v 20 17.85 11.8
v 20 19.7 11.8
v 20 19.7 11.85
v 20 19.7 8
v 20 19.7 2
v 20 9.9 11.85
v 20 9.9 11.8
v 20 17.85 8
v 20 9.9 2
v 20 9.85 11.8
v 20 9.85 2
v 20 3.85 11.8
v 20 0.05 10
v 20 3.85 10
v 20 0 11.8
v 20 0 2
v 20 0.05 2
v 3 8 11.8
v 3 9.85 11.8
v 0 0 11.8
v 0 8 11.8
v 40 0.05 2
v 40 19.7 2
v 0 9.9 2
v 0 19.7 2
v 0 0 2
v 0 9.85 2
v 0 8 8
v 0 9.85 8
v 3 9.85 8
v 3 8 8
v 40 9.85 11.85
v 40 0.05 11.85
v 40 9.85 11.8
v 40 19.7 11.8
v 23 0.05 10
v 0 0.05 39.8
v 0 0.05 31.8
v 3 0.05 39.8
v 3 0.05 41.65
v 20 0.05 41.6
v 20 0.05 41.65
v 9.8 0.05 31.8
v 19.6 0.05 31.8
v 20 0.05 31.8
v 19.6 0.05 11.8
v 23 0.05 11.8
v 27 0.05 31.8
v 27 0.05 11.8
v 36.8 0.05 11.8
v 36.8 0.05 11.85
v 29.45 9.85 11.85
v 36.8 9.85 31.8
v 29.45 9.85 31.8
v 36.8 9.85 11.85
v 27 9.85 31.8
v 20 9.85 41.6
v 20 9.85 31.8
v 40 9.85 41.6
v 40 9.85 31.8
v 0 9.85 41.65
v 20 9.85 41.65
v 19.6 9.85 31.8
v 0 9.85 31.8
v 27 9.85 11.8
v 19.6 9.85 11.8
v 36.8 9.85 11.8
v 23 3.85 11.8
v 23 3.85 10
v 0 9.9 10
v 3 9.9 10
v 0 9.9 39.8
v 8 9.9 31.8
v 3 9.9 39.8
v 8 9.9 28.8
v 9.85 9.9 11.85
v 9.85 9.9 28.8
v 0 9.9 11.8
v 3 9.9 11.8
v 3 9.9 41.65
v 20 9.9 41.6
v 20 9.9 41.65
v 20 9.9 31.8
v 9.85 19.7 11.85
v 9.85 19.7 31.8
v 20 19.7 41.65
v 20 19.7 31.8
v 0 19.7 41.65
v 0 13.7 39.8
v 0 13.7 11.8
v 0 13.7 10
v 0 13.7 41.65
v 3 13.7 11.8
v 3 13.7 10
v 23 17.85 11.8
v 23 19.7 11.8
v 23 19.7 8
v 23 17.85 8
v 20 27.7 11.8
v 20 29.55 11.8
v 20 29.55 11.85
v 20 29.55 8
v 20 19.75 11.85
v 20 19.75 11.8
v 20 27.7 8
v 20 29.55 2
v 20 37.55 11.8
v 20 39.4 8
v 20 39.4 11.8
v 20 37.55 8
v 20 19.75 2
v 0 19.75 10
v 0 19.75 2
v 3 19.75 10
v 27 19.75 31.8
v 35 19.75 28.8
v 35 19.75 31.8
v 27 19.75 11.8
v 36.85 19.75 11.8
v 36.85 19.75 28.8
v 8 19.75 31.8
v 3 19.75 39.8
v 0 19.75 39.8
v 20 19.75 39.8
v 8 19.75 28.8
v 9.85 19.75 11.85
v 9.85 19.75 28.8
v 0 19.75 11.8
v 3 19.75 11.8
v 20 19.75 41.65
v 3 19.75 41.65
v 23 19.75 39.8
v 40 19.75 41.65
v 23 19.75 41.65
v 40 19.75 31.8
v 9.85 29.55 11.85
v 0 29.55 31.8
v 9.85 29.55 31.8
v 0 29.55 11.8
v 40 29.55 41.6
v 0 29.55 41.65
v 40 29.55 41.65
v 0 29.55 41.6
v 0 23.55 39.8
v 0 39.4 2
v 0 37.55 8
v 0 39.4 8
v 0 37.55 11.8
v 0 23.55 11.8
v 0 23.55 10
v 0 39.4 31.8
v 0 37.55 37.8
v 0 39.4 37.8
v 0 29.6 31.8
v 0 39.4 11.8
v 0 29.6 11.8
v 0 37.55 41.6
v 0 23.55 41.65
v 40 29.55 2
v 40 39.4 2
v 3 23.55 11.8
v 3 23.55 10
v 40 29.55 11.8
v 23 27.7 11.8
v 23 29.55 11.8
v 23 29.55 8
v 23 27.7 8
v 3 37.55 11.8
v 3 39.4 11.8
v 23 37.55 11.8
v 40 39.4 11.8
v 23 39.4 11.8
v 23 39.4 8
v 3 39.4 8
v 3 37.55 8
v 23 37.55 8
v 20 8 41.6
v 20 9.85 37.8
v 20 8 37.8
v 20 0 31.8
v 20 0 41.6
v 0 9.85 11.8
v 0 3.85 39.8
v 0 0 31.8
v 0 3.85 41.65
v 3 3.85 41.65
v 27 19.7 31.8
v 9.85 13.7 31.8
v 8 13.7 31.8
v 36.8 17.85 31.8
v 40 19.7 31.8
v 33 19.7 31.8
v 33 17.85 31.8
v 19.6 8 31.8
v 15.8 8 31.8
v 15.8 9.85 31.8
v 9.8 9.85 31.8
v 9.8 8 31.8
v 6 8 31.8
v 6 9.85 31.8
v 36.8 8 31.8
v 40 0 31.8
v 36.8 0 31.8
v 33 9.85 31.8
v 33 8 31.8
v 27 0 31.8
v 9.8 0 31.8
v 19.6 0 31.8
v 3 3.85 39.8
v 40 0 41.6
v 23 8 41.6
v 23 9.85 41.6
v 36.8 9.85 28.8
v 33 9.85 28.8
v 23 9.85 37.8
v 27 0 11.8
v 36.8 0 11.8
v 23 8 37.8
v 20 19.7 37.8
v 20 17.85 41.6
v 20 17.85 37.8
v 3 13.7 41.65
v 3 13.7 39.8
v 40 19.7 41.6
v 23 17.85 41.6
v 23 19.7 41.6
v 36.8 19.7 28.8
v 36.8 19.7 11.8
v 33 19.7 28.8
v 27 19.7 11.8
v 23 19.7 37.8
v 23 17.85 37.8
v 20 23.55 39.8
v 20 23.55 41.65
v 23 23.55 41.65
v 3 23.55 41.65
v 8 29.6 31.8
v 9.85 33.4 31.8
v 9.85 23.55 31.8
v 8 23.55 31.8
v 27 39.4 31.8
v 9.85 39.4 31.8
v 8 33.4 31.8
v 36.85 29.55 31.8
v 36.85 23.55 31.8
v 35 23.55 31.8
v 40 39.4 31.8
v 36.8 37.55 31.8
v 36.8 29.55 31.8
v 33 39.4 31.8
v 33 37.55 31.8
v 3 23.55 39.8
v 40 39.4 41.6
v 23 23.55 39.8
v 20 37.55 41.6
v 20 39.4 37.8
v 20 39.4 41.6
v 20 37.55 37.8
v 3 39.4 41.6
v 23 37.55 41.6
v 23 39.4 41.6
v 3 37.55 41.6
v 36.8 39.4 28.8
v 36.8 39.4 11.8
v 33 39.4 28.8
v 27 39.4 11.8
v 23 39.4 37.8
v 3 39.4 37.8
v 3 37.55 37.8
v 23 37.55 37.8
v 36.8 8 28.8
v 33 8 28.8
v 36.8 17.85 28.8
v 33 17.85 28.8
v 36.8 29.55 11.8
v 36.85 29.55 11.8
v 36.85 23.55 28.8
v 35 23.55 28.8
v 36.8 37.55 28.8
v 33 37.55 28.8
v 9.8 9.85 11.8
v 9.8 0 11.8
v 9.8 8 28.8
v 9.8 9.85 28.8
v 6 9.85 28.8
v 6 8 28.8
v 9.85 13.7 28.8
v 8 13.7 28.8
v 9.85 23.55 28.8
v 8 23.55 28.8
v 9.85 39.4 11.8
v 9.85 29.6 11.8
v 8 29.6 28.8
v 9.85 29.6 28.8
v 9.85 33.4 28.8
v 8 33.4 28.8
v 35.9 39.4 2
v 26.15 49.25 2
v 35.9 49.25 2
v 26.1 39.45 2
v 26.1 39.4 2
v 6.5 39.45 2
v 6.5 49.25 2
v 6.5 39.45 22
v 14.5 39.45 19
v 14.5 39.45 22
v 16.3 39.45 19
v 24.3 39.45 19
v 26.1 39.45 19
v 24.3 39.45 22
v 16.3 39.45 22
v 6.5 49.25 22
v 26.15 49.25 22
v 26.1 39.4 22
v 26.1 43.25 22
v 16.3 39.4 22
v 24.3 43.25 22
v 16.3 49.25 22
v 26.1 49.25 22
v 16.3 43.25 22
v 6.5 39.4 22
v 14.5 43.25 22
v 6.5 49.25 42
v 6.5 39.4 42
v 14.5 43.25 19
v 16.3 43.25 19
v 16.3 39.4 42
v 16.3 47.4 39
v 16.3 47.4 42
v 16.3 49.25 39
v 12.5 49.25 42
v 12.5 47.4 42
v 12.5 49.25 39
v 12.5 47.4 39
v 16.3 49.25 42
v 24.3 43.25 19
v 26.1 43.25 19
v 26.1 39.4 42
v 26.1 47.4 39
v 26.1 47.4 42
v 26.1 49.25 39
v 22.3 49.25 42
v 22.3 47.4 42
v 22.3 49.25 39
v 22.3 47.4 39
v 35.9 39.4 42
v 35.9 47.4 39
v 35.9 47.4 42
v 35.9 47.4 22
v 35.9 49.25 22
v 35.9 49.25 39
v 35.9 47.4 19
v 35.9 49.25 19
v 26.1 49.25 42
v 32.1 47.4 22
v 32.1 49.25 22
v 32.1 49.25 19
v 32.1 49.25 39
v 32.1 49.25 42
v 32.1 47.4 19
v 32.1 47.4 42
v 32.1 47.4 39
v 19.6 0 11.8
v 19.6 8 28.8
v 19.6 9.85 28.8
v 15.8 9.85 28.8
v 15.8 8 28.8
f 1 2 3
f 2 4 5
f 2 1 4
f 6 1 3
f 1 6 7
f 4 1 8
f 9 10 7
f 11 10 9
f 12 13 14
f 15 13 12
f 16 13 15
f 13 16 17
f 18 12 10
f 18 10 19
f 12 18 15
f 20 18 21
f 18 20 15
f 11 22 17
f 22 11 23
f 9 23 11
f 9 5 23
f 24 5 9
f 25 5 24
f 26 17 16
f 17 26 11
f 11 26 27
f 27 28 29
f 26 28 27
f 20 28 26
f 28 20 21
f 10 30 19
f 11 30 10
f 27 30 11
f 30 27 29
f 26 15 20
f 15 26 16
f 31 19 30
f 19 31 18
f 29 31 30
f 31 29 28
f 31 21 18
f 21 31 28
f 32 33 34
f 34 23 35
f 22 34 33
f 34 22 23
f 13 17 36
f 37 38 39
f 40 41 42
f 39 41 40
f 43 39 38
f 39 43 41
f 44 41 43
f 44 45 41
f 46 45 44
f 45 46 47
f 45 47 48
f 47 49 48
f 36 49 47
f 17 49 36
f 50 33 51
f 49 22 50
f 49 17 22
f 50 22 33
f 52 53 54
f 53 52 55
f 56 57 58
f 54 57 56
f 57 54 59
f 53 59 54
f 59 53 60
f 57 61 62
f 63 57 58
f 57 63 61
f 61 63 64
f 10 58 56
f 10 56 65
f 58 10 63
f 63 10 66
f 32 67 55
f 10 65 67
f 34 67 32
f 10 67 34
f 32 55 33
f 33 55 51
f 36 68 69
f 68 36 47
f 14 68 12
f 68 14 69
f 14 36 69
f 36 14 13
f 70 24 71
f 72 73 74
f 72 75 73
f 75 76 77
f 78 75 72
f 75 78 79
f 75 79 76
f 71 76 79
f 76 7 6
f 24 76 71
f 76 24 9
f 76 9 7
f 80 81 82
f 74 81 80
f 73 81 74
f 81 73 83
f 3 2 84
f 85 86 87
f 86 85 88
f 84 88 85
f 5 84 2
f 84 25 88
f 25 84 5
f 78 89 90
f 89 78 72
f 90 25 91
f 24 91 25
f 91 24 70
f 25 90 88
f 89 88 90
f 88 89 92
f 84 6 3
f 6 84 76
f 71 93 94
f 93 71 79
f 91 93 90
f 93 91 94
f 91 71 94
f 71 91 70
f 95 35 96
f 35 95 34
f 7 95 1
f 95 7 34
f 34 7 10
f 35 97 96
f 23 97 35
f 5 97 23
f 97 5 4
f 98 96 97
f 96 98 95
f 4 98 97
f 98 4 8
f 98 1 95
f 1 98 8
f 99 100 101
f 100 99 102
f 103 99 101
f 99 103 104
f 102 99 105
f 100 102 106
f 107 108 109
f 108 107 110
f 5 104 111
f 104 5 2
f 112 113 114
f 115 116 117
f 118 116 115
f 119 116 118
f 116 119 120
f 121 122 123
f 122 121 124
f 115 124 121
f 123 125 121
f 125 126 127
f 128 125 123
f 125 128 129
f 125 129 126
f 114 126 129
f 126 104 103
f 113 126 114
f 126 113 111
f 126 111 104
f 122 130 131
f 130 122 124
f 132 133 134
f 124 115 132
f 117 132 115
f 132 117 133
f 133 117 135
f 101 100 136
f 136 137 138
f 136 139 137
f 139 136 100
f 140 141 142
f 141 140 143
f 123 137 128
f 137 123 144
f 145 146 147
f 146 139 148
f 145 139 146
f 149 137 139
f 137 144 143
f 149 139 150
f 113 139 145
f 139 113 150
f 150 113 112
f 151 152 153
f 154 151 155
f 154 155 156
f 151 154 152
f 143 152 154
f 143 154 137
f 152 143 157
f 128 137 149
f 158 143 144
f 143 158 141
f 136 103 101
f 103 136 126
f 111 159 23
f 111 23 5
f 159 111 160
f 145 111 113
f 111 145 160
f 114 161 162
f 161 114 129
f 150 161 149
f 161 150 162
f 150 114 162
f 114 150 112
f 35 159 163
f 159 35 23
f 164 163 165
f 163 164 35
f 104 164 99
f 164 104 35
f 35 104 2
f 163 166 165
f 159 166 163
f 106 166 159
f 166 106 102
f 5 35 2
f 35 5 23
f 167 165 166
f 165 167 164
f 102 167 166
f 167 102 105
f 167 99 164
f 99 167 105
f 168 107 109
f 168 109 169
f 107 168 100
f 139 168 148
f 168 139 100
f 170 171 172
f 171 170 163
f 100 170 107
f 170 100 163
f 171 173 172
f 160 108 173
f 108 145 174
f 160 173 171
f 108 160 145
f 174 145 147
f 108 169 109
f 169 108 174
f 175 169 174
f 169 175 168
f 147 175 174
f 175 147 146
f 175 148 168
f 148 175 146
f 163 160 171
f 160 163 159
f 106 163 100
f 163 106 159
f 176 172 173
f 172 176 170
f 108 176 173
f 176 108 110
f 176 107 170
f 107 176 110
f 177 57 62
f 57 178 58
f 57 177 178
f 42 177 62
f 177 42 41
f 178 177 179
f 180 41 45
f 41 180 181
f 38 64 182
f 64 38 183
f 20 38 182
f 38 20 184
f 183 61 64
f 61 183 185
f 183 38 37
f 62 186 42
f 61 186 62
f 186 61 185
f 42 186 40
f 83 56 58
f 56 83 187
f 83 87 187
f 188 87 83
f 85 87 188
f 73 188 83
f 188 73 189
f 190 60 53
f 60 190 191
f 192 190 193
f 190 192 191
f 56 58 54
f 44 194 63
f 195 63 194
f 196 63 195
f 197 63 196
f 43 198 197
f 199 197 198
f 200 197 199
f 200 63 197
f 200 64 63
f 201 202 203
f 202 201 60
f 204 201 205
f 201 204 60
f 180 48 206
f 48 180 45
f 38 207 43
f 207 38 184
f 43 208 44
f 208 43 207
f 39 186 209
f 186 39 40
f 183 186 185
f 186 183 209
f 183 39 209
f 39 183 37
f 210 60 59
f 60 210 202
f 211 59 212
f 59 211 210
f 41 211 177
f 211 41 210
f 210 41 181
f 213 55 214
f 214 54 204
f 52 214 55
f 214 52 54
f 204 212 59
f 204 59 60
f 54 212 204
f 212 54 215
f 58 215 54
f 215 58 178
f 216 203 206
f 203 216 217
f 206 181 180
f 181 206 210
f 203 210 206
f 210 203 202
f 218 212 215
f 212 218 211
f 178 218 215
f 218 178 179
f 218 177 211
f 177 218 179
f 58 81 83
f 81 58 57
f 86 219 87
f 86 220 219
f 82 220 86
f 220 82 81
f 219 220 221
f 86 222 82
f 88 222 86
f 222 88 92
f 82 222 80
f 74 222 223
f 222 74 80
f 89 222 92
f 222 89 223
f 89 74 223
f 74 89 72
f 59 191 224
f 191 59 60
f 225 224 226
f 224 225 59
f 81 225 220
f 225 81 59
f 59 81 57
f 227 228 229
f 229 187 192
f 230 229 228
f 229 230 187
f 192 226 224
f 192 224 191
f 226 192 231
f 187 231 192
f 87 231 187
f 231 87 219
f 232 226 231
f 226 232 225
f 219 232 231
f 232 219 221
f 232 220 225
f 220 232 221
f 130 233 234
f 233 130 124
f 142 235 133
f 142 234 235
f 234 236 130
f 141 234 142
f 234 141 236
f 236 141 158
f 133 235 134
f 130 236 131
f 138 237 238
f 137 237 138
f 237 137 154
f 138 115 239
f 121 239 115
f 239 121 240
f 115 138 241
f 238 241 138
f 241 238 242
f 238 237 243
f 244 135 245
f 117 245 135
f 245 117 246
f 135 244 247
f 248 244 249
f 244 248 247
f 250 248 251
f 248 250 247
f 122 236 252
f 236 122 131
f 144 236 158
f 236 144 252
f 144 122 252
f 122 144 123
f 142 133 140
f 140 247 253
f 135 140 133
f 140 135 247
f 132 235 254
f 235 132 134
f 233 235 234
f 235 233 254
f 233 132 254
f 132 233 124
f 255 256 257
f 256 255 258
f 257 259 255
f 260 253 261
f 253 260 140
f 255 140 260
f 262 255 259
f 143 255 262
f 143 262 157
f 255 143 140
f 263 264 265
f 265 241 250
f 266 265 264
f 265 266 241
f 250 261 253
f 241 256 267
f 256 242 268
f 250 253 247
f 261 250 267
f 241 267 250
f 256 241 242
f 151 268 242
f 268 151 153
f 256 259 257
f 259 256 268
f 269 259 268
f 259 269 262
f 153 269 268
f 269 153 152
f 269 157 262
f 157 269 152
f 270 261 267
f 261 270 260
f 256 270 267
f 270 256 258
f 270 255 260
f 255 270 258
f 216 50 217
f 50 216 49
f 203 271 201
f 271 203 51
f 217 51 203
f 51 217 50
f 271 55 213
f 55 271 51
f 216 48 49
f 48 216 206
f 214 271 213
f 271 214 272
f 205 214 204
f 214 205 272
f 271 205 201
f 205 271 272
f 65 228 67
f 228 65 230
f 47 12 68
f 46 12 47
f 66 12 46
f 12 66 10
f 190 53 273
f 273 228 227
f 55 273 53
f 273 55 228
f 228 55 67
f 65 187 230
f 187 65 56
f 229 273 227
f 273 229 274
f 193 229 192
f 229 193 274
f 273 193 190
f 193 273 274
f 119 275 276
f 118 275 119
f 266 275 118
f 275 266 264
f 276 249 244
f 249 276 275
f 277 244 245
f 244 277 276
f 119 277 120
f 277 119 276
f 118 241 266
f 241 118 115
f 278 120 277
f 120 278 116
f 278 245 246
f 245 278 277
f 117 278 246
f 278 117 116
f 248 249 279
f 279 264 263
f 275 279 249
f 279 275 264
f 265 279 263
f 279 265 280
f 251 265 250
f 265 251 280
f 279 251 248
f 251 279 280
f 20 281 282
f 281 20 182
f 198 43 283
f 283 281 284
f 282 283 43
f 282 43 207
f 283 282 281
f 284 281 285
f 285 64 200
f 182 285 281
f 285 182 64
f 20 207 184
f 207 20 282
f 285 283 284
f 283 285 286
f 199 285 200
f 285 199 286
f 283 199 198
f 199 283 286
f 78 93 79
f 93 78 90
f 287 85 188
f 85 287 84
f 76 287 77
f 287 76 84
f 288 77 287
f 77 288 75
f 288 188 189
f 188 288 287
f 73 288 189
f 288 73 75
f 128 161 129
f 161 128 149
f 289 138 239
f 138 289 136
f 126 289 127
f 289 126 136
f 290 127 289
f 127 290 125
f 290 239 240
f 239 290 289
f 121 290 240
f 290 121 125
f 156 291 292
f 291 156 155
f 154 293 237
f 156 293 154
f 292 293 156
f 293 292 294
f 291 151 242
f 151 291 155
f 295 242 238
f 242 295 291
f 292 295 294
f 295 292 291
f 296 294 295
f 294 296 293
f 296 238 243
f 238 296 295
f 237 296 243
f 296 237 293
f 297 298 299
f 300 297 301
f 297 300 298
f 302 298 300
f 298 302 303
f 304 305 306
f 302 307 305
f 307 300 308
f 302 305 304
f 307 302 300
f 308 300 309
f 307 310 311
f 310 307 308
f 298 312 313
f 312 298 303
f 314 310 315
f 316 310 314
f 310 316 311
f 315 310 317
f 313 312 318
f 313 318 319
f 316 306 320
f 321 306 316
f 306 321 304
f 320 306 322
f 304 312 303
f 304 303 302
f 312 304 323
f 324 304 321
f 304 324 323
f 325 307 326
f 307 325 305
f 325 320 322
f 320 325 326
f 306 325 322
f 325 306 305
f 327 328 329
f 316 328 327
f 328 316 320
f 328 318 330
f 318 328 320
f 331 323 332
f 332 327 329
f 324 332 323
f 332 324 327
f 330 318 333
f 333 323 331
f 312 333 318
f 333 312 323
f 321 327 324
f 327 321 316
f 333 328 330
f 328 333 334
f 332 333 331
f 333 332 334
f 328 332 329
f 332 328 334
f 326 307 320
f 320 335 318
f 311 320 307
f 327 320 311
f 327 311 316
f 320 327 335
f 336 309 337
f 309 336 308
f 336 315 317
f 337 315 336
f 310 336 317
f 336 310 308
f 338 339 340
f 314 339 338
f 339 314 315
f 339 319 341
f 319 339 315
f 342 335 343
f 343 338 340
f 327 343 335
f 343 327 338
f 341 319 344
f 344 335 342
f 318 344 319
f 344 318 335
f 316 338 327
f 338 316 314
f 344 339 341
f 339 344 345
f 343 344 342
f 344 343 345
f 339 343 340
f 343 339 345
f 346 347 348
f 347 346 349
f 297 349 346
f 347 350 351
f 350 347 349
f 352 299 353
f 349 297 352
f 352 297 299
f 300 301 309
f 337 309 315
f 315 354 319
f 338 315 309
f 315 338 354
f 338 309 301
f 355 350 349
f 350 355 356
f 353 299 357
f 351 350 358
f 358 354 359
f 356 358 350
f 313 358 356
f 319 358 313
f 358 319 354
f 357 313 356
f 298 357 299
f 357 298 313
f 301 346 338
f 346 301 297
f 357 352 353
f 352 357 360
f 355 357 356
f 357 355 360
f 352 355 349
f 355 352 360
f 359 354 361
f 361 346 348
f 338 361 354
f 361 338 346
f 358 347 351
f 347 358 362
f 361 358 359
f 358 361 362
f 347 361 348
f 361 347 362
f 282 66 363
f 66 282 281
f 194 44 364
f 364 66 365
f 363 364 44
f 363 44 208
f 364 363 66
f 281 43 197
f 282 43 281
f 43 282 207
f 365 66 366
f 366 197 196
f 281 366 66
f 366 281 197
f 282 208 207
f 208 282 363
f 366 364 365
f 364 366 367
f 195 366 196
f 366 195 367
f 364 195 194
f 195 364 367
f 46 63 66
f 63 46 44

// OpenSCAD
//units: inches. 


module waxblock1() {
   difference(){
        cube([20,9.85,9.8]);
        translate([-2,8,6]) {
               cube([5,5,5]);}
        }
        }
module waxblock2() {
    translate([0,9.85,0]) {
        rotate(a = 90, v = [10,0, 0])
        {waxblock1();}
            }
            }

module waxblockside1() {
    translate([0,0,20]) {
           rotate(a= 90, v=[0,10,0]) 
        {waxblock1();}}
        }

module waxblockside2() {
    translate([0,0,20]) {
           rotate(a= 90, v=[0,10,0]) 
        {waxblock2();}}
        }


for(x=[20], y=[9.85], z=[9.8]) {
    
//the paraffin side walls are pushed against the inside wall of plywood enclosure:
    
translate([0,0,2]) {waxblock1();}
translate([x,0,2]) {waxblock2();}
translate([0,y,2]) {waxblock2();}
translate([x,y,2]) {waxblock1();}
translate([0,2*y,2]) {waxblock2();}
translate([x,2*y,2]) {waxblock1();}
translate([0,3*y,2]) {waxblock1();}
translate([x,3*y,2]) {waxblock1();}

// in right side, 32.5 inches was replaced w x+z+2 to close the gap (Mein's instructions).

translate([0,0,x+z+2]) {waxblock2();}
translate([x,0,x+z+2]) {waxblock1();}
translate([0,y,x+z+2]) {waxblock2();}
translate([x,y,x+z+2]) {waxblock1();}
translate([0,2*y,x+z+2]) {waxblock2();}
translate([x,2*y,x+z+2]) {waxblock2();}
translate([0,3*y,x+z+2]) {waxblock1();}
translate([x,3*y,x+z+2]) {waxblock1();}

//the back paraffin blocks are pushed against inside wall of plywood enclosure:

translate([27,0,z+2]) {waxblockside1();}
translate([27,y,z+2]) {waxblockside1();}
translate([27,2*y,z+2]) {waxblockside2();}
translate([27,3*y,z+2]) {waxblockside1();}

//stand-in front wall:

translate([0,0,z+2]) {waxblockside1();}
translate([0,y,z+2]) { waxblockside2();}
translate([0,2*y,z+2]) { waxblockside2();}
translate([0,3*y,z+2]) { waxblockside2();}

//stand-in for paraffin on top of enclosure:

translate([6.5,4*y,2]) {waxblockside2();}
translate([6.5,4*y,2+x]) {waxblockside1();}
translate([6.5+z,4*y,2]) {waxblockside2();}
translate([6.5+z,4*y,2+x]) {waxblockside1();}
translate([6.5+2*z,4*y,2]) {waxblockside1();}
translate([6.5+2*z,4*y,2+x]) {waxblockside1();}

//stand-in for molded wax block at the bottom of the enclosure:

translate([z,0,z+2]) {waxblockside1();}
translate([2*z,0,z+2]) {waxblockside2();}


}
